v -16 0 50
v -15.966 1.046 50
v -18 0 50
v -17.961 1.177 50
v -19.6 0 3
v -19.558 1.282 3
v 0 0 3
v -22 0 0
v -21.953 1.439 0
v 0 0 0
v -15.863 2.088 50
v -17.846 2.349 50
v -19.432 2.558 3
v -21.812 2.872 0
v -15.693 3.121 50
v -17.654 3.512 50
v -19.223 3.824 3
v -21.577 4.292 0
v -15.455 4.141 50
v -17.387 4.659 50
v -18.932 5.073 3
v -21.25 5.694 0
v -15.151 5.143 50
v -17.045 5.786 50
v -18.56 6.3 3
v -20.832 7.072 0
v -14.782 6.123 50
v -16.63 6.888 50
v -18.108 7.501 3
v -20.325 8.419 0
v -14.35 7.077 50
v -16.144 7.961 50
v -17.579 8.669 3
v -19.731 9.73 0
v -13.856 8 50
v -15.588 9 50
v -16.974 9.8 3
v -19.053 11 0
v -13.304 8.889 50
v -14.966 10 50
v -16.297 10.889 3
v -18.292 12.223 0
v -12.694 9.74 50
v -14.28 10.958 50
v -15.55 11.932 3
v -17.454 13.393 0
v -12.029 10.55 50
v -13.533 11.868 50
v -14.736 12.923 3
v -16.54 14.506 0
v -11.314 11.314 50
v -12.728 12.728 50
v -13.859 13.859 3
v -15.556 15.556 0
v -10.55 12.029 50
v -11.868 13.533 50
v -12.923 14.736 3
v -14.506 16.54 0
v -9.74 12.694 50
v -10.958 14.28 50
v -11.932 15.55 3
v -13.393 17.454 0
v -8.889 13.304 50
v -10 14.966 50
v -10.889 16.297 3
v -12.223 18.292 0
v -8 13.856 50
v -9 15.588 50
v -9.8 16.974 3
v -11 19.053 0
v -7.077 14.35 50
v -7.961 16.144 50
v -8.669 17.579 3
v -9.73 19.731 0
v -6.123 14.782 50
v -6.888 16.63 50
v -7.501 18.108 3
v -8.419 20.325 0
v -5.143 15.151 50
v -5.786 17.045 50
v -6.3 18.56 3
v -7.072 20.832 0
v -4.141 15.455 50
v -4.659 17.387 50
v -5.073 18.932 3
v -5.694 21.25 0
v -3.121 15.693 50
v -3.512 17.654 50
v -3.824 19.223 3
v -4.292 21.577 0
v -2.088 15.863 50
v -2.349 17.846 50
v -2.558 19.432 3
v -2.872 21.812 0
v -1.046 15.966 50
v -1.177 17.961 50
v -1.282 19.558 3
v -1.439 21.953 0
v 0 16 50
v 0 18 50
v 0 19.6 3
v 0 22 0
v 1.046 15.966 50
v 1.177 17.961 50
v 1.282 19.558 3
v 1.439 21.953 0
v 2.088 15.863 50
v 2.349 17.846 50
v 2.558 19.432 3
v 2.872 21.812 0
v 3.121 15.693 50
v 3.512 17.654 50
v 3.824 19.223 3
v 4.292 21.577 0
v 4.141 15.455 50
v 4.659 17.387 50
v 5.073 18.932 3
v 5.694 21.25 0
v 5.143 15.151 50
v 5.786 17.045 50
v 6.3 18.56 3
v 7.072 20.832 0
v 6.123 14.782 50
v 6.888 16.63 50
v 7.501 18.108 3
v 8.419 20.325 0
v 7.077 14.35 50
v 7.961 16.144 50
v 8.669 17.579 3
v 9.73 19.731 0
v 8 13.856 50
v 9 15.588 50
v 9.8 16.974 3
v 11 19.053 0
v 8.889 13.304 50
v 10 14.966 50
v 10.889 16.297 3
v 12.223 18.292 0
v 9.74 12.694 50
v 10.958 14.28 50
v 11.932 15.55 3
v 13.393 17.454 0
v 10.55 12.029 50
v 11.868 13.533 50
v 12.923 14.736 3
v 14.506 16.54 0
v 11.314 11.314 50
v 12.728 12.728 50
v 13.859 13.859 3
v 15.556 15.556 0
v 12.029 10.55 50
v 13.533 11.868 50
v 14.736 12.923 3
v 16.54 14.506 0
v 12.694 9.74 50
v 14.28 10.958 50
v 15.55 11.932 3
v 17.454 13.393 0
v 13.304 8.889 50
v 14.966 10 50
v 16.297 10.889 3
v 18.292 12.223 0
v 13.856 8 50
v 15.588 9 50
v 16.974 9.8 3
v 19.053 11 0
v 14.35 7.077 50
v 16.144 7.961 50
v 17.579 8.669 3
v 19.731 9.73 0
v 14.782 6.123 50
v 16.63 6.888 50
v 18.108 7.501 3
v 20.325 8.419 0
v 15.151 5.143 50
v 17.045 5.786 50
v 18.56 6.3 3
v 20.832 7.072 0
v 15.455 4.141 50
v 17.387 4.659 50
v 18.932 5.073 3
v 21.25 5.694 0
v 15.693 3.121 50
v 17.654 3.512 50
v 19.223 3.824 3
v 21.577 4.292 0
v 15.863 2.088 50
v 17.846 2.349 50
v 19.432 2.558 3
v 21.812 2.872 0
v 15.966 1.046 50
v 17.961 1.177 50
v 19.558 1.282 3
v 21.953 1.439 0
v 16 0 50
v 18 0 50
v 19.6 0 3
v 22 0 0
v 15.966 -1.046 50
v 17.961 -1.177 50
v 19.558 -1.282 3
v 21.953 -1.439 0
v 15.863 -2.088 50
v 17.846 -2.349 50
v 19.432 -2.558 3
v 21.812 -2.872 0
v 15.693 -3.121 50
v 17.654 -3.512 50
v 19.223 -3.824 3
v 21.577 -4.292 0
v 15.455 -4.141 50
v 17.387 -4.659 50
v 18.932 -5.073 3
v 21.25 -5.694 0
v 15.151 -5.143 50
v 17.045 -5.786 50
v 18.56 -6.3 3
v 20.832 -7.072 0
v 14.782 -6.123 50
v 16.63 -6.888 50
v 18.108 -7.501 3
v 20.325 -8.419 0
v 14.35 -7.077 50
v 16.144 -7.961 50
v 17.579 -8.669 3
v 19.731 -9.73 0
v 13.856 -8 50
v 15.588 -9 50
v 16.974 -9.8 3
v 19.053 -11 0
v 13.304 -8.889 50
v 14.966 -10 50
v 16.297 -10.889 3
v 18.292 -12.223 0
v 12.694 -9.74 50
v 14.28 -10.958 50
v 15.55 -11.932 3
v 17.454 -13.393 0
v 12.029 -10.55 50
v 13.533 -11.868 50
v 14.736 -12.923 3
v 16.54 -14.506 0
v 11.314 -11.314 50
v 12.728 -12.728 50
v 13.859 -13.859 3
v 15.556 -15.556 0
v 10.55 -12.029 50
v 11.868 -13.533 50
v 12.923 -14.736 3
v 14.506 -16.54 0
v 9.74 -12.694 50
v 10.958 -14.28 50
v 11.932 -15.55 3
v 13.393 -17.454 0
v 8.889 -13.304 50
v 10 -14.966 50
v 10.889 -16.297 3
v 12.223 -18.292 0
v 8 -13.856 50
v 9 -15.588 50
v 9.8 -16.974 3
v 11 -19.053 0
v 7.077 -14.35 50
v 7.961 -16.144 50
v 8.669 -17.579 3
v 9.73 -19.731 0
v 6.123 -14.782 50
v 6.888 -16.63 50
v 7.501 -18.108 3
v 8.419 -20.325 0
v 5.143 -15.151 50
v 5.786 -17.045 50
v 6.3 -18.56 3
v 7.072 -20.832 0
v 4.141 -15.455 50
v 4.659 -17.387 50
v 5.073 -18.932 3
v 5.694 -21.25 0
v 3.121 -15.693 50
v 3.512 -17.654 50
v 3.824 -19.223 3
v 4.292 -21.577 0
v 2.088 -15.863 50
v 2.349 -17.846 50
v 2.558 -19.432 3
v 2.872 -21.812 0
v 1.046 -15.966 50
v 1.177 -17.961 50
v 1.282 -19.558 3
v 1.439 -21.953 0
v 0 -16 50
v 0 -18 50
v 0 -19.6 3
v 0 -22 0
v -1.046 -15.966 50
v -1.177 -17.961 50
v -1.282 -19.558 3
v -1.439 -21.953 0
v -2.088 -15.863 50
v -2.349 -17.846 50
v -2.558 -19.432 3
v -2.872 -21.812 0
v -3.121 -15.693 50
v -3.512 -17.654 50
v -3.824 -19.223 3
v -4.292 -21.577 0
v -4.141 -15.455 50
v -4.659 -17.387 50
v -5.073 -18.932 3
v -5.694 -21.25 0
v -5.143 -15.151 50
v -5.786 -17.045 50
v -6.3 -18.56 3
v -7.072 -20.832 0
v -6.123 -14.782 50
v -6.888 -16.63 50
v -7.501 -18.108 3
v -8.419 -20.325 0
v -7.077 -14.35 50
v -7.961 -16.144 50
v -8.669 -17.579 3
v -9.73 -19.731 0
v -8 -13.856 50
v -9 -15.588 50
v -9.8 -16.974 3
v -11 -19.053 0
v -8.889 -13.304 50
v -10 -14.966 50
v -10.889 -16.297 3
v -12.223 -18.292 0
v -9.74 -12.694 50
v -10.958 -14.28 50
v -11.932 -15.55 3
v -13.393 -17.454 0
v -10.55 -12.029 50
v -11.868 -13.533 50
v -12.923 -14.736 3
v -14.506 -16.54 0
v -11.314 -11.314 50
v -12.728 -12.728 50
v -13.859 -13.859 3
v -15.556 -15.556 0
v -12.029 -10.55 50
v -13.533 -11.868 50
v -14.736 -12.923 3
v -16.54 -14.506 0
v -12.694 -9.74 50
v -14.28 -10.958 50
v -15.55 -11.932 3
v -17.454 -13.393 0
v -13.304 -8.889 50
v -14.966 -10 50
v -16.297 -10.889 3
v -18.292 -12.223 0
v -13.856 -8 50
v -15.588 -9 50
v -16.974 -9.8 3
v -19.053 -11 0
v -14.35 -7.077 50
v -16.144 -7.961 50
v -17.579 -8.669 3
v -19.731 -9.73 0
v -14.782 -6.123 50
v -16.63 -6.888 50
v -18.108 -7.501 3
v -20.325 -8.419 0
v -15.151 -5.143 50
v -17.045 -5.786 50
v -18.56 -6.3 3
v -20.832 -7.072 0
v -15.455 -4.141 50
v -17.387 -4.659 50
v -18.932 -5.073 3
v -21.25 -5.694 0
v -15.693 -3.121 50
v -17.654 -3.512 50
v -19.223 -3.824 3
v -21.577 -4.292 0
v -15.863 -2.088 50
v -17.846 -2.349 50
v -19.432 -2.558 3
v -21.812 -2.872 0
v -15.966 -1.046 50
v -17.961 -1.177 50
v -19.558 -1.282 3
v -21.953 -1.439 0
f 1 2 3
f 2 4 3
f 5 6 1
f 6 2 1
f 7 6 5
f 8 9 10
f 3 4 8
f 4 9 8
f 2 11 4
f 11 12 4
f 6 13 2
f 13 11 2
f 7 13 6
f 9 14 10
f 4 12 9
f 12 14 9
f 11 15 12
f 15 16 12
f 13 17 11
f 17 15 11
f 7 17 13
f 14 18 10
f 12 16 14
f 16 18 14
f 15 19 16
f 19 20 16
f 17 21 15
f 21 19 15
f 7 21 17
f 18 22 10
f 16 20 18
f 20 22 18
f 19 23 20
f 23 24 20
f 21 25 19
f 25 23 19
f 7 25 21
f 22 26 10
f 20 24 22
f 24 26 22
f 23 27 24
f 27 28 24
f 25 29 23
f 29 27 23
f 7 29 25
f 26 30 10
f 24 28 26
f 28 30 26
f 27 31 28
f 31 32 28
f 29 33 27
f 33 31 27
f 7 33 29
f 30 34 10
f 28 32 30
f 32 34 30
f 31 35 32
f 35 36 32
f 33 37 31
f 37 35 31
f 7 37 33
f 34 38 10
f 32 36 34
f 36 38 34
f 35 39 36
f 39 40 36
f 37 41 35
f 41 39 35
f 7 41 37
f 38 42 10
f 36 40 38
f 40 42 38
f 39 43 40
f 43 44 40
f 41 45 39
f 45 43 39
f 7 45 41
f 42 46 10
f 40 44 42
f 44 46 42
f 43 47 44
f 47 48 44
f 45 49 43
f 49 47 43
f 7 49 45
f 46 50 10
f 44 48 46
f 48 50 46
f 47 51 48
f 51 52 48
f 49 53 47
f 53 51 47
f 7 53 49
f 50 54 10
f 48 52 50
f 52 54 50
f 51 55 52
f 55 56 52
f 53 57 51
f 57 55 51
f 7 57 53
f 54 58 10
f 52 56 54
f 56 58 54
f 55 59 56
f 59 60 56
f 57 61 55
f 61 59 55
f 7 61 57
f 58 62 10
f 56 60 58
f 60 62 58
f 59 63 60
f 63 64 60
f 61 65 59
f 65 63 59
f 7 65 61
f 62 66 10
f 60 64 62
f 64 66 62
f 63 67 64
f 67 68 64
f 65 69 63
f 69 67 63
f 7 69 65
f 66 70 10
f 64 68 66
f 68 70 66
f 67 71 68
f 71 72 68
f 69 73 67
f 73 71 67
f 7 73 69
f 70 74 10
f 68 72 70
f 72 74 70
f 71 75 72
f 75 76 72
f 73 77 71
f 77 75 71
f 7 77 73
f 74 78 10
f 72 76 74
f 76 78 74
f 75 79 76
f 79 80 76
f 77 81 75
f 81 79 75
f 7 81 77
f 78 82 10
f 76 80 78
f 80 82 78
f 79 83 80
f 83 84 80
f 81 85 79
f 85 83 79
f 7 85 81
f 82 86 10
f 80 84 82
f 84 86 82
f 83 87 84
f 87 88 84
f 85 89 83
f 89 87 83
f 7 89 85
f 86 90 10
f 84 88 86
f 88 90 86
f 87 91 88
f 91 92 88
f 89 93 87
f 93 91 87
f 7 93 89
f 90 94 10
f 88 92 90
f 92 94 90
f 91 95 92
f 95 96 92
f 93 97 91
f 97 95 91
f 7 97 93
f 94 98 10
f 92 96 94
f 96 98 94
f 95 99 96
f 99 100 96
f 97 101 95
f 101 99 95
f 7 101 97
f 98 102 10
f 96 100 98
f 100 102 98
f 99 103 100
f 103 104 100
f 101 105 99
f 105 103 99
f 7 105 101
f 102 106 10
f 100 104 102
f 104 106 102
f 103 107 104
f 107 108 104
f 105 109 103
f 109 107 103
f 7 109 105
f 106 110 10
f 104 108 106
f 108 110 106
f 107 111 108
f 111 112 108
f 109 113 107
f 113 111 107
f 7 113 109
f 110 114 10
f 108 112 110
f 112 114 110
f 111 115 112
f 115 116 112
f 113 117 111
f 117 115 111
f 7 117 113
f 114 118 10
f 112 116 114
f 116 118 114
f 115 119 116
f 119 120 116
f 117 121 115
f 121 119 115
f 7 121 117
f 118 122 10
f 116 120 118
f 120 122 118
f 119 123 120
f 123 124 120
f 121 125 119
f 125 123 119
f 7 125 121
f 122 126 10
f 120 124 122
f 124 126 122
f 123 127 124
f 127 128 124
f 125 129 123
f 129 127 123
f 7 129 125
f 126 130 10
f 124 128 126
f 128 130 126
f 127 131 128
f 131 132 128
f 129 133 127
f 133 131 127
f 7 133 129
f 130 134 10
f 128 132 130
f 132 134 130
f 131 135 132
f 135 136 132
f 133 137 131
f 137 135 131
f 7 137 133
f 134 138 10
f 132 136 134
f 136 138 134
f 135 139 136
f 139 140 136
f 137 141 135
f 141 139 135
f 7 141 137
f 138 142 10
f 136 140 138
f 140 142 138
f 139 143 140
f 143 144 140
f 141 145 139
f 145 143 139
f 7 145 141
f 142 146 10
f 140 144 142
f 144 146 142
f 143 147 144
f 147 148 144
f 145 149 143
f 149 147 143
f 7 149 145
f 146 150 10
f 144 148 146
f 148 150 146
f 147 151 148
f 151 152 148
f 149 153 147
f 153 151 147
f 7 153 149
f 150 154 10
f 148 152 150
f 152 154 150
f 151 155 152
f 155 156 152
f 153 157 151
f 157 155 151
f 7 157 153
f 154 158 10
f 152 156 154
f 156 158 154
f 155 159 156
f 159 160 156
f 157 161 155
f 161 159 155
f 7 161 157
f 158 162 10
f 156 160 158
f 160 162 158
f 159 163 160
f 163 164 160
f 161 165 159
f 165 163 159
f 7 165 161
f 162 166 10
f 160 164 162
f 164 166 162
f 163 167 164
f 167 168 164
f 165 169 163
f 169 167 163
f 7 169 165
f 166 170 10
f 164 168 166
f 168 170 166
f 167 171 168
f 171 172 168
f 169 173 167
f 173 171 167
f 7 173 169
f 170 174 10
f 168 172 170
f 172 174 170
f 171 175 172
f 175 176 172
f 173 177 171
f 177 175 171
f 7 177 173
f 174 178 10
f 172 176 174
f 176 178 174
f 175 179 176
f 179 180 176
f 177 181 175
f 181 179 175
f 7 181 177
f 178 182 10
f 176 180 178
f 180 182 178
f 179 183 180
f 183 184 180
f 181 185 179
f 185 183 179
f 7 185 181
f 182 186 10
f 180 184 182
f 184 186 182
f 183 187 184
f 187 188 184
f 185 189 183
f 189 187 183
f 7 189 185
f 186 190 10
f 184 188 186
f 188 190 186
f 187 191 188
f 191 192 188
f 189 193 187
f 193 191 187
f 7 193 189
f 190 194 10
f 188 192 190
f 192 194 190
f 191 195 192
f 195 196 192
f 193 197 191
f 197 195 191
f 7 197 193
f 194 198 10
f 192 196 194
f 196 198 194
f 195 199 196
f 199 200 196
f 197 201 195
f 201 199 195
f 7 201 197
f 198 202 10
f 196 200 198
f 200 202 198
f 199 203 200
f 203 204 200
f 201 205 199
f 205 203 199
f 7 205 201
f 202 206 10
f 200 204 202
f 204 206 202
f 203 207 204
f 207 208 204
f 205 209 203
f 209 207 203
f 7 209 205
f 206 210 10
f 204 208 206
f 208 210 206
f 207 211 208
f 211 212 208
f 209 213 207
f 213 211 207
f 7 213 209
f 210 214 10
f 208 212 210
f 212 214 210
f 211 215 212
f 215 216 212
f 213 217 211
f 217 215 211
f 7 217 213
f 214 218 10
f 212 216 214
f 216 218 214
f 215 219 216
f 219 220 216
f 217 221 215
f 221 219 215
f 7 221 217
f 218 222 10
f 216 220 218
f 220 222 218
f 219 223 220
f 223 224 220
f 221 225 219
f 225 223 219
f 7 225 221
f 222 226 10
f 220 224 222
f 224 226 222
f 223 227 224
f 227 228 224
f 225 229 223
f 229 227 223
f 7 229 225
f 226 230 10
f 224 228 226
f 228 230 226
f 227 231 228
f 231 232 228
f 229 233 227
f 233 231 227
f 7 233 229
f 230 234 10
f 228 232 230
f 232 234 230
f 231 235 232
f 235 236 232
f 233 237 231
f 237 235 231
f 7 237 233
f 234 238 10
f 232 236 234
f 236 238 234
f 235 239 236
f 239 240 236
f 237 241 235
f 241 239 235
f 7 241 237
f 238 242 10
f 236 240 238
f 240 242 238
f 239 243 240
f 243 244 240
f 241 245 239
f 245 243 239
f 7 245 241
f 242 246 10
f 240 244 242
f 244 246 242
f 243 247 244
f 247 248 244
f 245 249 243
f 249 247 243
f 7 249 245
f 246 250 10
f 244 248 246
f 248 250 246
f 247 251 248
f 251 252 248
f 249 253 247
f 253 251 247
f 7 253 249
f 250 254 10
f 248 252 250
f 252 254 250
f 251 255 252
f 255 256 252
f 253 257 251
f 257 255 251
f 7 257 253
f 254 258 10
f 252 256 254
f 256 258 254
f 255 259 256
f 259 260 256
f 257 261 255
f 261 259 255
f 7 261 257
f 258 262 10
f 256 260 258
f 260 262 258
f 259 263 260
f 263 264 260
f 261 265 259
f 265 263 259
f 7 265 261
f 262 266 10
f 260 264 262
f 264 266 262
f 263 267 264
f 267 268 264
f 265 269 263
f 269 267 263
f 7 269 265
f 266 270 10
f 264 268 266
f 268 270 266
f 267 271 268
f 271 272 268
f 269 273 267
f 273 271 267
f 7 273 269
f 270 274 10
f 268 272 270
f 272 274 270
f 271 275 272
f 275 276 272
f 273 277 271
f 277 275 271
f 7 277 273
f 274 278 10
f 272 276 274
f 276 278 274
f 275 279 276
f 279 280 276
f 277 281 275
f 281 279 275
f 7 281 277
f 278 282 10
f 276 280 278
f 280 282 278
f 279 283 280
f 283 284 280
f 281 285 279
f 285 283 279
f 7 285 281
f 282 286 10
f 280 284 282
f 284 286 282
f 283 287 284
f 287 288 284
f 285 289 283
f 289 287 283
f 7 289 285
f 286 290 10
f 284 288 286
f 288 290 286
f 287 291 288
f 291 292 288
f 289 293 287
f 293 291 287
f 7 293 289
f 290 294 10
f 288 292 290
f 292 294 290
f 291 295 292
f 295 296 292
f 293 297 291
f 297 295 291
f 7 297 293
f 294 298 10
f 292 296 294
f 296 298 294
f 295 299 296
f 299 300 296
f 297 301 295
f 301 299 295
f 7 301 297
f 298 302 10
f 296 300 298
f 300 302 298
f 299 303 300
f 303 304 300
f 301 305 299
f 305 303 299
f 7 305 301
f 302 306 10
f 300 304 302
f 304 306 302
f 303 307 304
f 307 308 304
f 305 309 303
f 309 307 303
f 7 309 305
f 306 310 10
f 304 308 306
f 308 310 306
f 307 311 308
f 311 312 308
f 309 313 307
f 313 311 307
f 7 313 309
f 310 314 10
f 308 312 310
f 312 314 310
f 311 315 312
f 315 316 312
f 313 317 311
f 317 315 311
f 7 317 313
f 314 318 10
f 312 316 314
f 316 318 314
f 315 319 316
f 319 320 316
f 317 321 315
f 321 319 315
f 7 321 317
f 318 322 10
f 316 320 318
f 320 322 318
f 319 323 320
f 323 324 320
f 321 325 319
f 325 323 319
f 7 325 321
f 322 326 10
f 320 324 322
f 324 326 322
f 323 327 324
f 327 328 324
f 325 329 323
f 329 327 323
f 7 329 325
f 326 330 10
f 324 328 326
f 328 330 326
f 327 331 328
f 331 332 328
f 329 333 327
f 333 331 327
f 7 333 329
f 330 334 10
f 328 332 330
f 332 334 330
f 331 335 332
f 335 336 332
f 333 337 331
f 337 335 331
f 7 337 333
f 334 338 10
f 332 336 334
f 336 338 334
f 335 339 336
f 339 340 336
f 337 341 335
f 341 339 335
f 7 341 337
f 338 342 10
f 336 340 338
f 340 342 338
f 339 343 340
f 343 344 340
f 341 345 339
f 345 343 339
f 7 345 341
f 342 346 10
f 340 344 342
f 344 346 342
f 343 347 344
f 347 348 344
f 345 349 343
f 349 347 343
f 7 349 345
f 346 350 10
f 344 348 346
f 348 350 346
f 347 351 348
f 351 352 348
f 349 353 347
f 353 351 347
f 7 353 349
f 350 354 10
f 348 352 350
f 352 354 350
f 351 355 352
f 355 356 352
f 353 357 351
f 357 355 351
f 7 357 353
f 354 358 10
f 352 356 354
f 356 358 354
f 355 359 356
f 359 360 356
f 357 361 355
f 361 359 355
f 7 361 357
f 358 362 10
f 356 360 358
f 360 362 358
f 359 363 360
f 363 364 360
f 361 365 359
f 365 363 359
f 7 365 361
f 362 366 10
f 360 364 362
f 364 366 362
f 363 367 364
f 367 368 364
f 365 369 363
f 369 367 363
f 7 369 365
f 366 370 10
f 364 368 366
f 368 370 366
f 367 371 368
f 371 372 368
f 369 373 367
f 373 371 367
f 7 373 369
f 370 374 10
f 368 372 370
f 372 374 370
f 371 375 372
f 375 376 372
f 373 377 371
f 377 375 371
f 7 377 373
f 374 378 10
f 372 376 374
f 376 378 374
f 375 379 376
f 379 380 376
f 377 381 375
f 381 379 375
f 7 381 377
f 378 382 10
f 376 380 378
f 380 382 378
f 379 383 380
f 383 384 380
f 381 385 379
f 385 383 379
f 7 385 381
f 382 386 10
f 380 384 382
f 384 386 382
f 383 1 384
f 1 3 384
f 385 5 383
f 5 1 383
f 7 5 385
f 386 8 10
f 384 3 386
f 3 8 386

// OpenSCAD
// Open vase produced by revolving a wall profile.
base_r = 22;
top_r = 18;
height = 50;
wall = 2;
floor_t = 3;

module vase() {
    rotate_extrude($fn = 96)
        polygon([
            [0, 0],
            [base_r, 0],
            [top_r, height],
            [top_r - wall, height],
            [base_r - wall - 0.4, floor_t],
            [0, floor_t]
        ]);
}

vase();
